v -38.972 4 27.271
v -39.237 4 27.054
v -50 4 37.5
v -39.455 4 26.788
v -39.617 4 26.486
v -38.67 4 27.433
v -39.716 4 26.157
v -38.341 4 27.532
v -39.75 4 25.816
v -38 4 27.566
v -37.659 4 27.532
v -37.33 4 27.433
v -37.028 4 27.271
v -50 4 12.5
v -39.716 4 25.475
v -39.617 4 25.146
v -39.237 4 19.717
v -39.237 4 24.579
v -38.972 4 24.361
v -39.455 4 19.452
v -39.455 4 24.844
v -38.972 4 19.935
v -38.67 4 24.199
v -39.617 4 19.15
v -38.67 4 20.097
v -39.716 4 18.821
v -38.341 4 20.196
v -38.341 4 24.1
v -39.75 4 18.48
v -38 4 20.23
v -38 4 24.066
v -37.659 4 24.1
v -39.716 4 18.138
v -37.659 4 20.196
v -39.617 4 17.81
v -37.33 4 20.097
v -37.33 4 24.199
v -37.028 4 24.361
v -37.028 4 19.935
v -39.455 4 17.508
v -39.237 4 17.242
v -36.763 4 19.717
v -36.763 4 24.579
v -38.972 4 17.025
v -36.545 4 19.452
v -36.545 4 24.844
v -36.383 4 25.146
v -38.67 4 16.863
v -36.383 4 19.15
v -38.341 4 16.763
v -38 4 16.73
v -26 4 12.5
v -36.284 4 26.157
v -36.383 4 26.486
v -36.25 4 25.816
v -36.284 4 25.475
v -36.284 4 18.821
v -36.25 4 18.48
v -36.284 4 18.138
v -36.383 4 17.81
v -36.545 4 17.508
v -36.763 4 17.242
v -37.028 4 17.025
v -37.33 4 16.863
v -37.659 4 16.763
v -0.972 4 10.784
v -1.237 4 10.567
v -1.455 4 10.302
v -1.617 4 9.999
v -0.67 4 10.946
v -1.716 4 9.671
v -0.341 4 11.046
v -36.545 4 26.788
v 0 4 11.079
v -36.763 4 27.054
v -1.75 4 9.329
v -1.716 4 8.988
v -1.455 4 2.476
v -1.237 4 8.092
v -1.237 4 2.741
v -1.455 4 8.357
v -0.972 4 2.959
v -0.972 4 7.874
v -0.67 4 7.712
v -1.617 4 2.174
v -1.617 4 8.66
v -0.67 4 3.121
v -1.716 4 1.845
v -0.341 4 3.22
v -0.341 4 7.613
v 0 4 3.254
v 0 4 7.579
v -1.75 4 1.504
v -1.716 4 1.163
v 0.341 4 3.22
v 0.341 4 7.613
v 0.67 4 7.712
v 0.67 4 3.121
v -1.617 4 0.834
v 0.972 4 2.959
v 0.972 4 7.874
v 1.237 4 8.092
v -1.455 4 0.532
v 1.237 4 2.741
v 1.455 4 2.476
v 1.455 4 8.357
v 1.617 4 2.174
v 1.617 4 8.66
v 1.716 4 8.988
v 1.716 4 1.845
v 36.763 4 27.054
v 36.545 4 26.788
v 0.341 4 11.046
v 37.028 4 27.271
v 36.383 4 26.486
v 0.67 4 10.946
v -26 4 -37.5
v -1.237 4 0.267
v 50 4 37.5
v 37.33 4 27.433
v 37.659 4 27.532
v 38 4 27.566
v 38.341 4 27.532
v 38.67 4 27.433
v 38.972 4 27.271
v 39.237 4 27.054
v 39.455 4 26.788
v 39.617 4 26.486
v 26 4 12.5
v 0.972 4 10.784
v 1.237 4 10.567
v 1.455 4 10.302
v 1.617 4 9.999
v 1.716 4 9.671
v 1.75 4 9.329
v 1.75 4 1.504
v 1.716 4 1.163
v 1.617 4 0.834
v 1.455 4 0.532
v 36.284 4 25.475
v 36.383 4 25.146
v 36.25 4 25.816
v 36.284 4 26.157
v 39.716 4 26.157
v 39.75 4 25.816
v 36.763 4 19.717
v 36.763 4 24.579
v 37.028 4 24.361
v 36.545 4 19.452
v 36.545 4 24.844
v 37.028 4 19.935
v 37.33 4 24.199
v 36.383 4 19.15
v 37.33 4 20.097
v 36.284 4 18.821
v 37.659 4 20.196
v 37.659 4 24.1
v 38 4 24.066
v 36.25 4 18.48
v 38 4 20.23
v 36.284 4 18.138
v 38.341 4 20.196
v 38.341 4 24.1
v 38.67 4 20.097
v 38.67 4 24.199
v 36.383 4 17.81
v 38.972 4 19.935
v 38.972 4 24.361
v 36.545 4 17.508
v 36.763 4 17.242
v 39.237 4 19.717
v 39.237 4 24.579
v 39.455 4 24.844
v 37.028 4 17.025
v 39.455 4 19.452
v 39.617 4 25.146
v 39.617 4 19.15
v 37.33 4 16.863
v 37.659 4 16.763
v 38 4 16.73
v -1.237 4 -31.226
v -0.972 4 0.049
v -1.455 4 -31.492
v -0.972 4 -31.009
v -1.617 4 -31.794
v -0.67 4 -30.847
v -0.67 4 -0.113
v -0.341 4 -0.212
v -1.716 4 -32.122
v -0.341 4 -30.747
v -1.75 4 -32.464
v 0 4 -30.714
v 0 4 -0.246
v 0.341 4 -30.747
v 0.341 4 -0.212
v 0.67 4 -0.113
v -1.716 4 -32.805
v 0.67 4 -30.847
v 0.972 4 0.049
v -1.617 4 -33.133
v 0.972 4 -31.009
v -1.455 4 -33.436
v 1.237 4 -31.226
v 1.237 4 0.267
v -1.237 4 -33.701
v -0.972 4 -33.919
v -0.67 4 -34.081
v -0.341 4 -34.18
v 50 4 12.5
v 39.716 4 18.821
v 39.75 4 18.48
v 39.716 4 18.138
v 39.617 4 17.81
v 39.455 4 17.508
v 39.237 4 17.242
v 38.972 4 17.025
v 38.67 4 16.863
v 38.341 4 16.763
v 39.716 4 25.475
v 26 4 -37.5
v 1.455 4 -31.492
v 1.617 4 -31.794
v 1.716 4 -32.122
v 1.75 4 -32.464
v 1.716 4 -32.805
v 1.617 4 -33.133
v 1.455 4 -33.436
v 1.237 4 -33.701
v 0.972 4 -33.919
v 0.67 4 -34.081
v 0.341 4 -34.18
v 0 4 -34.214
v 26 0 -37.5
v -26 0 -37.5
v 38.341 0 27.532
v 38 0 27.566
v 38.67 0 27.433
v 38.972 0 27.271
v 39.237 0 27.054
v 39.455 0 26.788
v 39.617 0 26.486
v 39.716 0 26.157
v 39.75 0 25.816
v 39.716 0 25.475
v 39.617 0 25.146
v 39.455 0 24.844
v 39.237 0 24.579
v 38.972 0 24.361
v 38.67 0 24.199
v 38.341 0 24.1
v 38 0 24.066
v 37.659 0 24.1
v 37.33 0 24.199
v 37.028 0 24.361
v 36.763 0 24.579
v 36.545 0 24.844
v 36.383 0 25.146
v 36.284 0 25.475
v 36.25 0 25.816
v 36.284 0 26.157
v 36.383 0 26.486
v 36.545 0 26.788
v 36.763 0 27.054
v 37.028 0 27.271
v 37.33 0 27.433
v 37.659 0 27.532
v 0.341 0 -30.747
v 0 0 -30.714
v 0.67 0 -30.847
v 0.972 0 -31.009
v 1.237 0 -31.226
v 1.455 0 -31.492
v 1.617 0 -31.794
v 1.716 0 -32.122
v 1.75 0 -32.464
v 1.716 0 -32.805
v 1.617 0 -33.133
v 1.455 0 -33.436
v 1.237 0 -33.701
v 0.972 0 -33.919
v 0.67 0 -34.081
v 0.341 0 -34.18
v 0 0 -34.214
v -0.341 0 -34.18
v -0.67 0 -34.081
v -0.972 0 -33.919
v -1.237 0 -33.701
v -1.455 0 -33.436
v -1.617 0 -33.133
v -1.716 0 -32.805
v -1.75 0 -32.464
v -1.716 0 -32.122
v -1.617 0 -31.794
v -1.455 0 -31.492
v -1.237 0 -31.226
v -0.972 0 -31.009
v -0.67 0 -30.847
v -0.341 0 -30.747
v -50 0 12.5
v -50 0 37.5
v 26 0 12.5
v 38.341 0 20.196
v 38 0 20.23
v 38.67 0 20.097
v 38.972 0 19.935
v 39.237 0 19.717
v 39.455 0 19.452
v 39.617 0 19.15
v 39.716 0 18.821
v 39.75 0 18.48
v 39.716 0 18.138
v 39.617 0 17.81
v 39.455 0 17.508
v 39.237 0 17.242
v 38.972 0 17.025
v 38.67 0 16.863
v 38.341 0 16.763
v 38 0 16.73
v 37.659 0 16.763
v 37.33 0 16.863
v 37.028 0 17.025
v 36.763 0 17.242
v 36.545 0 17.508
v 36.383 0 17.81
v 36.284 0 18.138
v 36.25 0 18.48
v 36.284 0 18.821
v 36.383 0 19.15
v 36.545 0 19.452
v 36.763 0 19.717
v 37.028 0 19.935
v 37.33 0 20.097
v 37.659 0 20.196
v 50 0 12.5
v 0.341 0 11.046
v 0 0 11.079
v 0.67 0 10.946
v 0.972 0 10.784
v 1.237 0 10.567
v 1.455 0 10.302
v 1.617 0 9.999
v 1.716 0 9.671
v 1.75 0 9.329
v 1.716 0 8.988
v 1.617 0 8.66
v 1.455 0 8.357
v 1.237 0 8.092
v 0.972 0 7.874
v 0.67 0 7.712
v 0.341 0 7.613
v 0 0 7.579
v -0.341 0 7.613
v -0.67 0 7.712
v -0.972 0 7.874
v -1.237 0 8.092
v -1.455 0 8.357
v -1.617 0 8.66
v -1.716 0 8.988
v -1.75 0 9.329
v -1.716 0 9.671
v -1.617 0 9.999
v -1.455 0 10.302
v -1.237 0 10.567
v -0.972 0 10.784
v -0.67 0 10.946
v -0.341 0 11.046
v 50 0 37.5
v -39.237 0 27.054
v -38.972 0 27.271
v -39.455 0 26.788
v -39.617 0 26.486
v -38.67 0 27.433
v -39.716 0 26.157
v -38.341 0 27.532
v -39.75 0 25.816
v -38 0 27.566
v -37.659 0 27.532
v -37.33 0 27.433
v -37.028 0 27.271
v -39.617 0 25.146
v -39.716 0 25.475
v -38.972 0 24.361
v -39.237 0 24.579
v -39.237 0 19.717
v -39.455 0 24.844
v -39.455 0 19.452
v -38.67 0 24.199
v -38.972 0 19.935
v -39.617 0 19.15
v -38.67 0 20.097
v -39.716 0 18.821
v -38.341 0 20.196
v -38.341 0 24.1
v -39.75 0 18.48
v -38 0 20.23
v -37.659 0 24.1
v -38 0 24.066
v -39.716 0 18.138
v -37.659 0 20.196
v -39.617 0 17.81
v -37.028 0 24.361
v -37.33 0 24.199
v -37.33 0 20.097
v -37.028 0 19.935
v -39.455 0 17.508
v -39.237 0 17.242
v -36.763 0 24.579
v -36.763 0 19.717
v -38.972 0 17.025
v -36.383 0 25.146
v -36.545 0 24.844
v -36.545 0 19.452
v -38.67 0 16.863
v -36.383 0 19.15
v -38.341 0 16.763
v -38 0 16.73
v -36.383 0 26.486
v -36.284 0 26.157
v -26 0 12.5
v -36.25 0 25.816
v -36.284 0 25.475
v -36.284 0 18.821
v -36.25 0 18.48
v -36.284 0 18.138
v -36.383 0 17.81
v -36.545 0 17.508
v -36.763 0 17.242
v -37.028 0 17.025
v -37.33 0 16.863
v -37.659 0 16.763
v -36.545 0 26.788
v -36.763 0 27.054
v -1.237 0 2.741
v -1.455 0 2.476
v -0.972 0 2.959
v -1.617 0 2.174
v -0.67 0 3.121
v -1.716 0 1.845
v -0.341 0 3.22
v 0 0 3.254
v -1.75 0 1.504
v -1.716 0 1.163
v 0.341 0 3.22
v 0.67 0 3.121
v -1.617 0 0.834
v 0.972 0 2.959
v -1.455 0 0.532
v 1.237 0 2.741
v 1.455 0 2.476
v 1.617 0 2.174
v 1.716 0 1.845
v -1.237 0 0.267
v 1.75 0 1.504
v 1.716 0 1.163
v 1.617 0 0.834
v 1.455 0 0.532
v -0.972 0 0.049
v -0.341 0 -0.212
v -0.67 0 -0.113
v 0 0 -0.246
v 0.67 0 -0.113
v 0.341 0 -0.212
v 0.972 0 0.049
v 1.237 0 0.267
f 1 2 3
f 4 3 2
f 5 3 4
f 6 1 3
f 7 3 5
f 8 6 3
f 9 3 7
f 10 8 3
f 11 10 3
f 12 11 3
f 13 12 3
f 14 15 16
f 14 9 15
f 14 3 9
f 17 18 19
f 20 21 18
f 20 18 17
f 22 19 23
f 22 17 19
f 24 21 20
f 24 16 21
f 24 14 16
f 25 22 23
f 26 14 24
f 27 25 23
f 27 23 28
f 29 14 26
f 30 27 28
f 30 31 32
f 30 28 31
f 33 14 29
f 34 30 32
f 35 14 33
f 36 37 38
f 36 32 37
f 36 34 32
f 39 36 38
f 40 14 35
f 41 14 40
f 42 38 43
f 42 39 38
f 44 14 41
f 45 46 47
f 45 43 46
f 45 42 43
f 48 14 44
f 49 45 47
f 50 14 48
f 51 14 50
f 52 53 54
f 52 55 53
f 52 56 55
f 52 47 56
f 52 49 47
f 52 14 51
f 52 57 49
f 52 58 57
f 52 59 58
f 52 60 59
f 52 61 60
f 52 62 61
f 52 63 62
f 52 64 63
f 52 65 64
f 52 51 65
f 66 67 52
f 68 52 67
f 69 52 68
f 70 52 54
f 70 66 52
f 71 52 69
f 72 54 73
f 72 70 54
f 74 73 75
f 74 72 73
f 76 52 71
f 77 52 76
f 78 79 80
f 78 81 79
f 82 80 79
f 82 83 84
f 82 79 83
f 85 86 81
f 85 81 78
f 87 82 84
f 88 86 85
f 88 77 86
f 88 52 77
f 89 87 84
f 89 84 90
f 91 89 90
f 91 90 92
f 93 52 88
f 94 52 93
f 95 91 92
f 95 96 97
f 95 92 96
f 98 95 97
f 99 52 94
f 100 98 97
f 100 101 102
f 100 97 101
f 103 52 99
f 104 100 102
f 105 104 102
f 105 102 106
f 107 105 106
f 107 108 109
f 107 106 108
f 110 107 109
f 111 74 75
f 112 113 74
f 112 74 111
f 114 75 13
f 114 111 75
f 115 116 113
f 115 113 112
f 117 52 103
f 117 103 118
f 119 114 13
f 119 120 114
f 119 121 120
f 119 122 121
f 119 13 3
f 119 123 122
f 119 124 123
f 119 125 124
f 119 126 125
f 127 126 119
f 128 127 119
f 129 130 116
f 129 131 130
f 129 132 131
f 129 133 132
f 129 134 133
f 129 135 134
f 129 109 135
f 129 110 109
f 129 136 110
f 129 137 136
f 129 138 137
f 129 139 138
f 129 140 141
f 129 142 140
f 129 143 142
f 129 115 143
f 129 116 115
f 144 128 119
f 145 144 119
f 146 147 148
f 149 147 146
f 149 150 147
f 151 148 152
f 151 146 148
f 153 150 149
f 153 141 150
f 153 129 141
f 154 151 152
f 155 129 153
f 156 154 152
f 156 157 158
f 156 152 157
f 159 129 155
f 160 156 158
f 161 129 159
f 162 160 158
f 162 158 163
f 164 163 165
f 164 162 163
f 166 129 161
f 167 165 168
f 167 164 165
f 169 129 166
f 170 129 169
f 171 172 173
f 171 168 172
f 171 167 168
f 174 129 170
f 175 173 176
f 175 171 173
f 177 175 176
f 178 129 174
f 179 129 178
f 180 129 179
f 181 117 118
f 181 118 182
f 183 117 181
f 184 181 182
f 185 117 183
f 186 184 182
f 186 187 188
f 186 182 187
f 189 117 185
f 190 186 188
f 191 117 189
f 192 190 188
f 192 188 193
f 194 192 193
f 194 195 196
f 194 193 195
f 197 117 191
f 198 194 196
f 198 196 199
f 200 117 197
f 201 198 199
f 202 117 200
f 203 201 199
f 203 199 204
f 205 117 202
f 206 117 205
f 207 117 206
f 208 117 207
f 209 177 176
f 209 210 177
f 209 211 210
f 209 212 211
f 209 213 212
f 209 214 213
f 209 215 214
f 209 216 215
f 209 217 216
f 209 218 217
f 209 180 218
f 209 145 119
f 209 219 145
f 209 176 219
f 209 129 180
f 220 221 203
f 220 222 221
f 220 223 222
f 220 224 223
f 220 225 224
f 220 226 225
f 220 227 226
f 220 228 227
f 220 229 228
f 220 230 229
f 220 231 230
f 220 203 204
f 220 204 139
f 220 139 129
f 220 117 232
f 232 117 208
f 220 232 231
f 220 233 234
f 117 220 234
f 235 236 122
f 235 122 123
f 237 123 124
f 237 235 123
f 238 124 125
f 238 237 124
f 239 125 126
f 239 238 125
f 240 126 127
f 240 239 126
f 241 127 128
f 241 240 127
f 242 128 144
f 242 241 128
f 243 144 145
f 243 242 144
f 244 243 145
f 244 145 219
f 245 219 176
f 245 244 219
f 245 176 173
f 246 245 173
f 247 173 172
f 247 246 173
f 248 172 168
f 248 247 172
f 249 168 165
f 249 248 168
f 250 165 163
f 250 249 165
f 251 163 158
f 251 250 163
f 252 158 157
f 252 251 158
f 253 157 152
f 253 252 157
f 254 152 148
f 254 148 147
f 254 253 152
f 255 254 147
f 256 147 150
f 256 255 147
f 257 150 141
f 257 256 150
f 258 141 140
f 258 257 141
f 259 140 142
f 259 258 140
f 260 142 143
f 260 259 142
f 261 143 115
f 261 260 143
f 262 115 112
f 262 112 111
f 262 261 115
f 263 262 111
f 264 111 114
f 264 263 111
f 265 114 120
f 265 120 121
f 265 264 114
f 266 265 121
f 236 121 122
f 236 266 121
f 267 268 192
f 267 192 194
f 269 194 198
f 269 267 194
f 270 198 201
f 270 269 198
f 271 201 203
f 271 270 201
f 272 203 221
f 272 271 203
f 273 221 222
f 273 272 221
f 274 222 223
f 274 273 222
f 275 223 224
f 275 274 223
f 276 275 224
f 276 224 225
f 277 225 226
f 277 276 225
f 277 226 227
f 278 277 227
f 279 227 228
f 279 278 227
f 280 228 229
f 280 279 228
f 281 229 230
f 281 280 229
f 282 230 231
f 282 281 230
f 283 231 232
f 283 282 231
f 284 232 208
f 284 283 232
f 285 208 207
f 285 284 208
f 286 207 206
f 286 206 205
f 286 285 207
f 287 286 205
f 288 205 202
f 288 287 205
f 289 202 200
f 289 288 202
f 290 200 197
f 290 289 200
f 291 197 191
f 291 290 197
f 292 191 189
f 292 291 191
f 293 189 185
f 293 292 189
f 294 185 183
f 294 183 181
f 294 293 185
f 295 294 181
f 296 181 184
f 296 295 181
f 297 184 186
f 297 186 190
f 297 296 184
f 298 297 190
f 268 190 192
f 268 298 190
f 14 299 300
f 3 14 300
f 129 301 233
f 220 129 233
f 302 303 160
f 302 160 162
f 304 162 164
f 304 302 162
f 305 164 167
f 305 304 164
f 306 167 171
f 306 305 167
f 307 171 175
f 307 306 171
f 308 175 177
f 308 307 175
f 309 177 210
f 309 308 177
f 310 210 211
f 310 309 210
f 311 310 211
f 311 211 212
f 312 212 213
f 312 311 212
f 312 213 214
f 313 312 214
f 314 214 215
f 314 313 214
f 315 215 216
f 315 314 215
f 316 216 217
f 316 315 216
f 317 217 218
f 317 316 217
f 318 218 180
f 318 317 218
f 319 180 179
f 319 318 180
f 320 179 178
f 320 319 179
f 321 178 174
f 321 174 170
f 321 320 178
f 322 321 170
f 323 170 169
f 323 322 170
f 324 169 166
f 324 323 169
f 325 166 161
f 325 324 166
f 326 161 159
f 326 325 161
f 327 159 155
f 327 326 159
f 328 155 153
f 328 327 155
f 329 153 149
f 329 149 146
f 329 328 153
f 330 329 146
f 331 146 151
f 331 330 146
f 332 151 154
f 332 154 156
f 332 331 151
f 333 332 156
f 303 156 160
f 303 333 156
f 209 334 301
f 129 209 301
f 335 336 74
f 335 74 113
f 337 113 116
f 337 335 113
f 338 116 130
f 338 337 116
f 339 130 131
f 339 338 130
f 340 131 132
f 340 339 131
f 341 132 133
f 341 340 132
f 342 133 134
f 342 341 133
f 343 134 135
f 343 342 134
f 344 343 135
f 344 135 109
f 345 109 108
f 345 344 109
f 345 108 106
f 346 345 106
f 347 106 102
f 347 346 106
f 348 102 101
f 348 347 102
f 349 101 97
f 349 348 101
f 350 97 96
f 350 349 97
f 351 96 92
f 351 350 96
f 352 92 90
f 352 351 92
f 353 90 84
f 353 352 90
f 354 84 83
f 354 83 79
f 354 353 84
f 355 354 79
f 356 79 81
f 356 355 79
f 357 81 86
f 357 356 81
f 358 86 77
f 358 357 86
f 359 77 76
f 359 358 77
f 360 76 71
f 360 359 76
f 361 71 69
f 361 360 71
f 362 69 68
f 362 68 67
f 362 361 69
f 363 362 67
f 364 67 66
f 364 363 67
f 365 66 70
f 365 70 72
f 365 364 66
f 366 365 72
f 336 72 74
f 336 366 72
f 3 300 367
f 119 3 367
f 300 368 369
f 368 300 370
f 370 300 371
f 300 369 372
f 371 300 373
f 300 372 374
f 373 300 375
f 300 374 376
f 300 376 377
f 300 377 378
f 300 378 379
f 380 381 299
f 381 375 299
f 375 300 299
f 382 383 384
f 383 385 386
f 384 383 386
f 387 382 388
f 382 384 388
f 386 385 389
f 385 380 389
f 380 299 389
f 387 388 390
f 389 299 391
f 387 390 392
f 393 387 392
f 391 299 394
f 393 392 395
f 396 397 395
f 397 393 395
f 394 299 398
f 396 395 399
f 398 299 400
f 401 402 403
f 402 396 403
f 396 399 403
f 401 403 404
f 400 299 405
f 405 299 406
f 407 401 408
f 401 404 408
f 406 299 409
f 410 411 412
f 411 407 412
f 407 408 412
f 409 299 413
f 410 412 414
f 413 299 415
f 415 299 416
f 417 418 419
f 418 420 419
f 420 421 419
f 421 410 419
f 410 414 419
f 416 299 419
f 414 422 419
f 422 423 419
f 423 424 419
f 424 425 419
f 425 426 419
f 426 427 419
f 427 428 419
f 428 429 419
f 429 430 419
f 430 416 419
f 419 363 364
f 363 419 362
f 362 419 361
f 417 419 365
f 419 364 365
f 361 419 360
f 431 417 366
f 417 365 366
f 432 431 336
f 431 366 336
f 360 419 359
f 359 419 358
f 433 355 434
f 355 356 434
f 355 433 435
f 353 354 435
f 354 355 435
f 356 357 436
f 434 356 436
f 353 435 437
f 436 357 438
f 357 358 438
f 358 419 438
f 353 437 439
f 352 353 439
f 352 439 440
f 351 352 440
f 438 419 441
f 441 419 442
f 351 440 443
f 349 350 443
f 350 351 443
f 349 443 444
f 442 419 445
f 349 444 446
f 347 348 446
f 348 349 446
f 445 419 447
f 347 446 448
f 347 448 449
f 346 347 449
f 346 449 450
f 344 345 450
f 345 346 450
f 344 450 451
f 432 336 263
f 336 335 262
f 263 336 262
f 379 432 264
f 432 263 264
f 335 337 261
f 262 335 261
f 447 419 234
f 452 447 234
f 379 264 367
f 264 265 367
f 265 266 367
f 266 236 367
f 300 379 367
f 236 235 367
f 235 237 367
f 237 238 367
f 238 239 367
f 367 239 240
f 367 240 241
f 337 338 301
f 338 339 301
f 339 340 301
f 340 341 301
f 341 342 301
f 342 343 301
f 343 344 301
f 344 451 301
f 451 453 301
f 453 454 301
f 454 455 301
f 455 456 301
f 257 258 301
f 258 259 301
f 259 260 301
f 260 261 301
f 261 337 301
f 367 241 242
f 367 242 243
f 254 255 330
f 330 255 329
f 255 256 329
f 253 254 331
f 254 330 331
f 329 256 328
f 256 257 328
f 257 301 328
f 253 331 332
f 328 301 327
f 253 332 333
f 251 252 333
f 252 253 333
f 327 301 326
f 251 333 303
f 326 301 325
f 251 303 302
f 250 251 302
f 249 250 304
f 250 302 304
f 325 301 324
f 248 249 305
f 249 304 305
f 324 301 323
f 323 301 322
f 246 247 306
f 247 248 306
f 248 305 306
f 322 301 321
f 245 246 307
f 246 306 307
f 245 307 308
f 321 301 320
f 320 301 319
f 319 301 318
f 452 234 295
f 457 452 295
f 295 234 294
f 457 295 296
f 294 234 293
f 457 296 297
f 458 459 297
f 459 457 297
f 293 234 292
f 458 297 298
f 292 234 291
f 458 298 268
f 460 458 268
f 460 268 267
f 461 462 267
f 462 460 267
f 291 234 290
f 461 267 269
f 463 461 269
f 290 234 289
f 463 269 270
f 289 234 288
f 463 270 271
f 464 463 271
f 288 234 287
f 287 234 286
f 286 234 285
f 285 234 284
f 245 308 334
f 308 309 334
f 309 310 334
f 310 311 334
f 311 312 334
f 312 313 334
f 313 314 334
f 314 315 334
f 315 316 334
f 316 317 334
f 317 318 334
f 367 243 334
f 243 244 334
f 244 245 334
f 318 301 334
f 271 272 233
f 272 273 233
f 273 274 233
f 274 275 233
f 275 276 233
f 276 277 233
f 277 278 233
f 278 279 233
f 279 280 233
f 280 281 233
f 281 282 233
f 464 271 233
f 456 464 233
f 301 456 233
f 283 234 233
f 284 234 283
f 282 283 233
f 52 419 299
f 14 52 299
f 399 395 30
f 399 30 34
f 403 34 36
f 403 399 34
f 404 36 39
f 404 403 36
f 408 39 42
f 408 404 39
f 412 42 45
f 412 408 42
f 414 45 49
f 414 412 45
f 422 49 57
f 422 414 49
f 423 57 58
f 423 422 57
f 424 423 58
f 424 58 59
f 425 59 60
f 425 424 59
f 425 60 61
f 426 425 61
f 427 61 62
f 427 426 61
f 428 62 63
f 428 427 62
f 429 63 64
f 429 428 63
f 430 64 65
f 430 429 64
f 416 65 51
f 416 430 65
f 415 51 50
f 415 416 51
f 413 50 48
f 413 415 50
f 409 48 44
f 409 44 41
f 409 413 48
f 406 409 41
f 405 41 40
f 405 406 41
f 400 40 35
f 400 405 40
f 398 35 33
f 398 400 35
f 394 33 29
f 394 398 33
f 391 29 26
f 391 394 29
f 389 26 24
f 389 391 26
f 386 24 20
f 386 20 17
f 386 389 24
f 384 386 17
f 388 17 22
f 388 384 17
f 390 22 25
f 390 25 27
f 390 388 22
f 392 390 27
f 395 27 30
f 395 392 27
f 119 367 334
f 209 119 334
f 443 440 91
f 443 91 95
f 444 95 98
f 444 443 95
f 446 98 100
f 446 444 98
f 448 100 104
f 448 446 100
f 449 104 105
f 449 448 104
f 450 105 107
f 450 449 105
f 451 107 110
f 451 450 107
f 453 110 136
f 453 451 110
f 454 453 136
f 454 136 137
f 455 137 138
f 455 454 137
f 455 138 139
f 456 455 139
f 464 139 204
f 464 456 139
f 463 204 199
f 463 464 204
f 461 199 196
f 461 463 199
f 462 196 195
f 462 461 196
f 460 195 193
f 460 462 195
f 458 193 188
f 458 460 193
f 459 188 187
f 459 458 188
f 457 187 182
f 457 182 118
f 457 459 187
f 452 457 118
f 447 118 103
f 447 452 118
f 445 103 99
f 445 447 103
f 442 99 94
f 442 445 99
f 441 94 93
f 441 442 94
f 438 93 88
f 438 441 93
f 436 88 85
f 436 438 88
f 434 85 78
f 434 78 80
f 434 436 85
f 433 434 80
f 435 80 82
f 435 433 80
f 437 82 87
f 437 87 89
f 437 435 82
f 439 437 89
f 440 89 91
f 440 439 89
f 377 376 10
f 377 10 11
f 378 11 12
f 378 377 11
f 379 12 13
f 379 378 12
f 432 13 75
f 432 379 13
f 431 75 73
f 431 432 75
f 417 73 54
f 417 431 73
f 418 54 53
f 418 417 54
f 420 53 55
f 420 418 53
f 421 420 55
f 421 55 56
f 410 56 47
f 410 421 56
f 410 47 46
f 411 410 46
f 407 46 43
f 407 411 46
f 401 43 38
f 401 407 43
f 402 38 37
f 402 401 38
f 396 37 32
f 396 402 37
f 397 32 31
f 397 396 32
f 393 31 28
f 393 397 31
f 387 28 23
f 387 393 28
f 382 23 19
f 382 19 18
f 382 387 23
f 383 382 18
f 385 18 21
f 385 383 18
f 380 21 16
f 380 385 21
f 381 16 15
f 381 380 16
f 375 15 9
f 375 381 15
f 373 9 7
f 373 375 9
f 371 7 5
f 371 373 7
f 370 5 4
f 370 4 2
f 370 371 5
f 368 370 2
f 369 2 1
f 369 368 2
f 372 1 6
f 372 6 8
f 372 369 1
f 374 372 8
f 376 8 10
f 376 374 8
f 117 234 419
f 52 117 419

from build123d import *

# Parameters (mm, degrees)
CROQUIS1_R              = 1.75
SALIENTE_EXTRUIR1_DEPTH = 4


with BuildPart() as part:
    # Croquis1 → Saliente-Extruir1 (new body)
    with BuildSketch(Plane(origin=(0, 0, 0), x_dir=(1, 0, 0), z_dir=(0, 1, 0))):
        Polygon((-26, -12.5), (-50, -12.5), (-50, -37.5), (50, -37.5), (50, -12.5), (26, -12.5), (26, 37.5), (-26, 37.5), align=None)
        with Locations(Location((-38, -25.816065761, 0), (0, 0, 270))):
            Circle(CROQUIS1_R, mode=Mode.SUBTRACT)
        with Locations(Location((-38, -18.479827089, 0), (0, 0, 270))):
            Circle(CROQUIS1_R, mode=Mode.SUBTRACT)
        with Locations(Location((0, -9.329285485, 0), (0, 0, 270))):
            Circle(CROQUIS1_R, mode=Mode.SUBTRACT)
        with Locations(Location((0, -1.504051409, 0), (0, 0, 270))):
            Circle(CROQUIS1_R, mode=Mode.SUBTRACT)
        with Locations(Location((38, -25.816065761, 0), (0, 0, 270))):
            Circle(CROQUIS1_R, mode=Mode.SUBTRACT)
        with Locations(Location((38, -18.479827089, 0), (0, 0, 270))):
            Circle(CROQUIS1_R, mode=Mode.SUBTRACT)
        with Locations(Location((0, 32.46376687, 0), (0, 0, 270))):
            Circle(CROQUIS1_R, mode=Mode.SUBTRACT)
    extrude(amount=SALIENTE_EXTRUIR1_DEPTH)


solid = part.part
